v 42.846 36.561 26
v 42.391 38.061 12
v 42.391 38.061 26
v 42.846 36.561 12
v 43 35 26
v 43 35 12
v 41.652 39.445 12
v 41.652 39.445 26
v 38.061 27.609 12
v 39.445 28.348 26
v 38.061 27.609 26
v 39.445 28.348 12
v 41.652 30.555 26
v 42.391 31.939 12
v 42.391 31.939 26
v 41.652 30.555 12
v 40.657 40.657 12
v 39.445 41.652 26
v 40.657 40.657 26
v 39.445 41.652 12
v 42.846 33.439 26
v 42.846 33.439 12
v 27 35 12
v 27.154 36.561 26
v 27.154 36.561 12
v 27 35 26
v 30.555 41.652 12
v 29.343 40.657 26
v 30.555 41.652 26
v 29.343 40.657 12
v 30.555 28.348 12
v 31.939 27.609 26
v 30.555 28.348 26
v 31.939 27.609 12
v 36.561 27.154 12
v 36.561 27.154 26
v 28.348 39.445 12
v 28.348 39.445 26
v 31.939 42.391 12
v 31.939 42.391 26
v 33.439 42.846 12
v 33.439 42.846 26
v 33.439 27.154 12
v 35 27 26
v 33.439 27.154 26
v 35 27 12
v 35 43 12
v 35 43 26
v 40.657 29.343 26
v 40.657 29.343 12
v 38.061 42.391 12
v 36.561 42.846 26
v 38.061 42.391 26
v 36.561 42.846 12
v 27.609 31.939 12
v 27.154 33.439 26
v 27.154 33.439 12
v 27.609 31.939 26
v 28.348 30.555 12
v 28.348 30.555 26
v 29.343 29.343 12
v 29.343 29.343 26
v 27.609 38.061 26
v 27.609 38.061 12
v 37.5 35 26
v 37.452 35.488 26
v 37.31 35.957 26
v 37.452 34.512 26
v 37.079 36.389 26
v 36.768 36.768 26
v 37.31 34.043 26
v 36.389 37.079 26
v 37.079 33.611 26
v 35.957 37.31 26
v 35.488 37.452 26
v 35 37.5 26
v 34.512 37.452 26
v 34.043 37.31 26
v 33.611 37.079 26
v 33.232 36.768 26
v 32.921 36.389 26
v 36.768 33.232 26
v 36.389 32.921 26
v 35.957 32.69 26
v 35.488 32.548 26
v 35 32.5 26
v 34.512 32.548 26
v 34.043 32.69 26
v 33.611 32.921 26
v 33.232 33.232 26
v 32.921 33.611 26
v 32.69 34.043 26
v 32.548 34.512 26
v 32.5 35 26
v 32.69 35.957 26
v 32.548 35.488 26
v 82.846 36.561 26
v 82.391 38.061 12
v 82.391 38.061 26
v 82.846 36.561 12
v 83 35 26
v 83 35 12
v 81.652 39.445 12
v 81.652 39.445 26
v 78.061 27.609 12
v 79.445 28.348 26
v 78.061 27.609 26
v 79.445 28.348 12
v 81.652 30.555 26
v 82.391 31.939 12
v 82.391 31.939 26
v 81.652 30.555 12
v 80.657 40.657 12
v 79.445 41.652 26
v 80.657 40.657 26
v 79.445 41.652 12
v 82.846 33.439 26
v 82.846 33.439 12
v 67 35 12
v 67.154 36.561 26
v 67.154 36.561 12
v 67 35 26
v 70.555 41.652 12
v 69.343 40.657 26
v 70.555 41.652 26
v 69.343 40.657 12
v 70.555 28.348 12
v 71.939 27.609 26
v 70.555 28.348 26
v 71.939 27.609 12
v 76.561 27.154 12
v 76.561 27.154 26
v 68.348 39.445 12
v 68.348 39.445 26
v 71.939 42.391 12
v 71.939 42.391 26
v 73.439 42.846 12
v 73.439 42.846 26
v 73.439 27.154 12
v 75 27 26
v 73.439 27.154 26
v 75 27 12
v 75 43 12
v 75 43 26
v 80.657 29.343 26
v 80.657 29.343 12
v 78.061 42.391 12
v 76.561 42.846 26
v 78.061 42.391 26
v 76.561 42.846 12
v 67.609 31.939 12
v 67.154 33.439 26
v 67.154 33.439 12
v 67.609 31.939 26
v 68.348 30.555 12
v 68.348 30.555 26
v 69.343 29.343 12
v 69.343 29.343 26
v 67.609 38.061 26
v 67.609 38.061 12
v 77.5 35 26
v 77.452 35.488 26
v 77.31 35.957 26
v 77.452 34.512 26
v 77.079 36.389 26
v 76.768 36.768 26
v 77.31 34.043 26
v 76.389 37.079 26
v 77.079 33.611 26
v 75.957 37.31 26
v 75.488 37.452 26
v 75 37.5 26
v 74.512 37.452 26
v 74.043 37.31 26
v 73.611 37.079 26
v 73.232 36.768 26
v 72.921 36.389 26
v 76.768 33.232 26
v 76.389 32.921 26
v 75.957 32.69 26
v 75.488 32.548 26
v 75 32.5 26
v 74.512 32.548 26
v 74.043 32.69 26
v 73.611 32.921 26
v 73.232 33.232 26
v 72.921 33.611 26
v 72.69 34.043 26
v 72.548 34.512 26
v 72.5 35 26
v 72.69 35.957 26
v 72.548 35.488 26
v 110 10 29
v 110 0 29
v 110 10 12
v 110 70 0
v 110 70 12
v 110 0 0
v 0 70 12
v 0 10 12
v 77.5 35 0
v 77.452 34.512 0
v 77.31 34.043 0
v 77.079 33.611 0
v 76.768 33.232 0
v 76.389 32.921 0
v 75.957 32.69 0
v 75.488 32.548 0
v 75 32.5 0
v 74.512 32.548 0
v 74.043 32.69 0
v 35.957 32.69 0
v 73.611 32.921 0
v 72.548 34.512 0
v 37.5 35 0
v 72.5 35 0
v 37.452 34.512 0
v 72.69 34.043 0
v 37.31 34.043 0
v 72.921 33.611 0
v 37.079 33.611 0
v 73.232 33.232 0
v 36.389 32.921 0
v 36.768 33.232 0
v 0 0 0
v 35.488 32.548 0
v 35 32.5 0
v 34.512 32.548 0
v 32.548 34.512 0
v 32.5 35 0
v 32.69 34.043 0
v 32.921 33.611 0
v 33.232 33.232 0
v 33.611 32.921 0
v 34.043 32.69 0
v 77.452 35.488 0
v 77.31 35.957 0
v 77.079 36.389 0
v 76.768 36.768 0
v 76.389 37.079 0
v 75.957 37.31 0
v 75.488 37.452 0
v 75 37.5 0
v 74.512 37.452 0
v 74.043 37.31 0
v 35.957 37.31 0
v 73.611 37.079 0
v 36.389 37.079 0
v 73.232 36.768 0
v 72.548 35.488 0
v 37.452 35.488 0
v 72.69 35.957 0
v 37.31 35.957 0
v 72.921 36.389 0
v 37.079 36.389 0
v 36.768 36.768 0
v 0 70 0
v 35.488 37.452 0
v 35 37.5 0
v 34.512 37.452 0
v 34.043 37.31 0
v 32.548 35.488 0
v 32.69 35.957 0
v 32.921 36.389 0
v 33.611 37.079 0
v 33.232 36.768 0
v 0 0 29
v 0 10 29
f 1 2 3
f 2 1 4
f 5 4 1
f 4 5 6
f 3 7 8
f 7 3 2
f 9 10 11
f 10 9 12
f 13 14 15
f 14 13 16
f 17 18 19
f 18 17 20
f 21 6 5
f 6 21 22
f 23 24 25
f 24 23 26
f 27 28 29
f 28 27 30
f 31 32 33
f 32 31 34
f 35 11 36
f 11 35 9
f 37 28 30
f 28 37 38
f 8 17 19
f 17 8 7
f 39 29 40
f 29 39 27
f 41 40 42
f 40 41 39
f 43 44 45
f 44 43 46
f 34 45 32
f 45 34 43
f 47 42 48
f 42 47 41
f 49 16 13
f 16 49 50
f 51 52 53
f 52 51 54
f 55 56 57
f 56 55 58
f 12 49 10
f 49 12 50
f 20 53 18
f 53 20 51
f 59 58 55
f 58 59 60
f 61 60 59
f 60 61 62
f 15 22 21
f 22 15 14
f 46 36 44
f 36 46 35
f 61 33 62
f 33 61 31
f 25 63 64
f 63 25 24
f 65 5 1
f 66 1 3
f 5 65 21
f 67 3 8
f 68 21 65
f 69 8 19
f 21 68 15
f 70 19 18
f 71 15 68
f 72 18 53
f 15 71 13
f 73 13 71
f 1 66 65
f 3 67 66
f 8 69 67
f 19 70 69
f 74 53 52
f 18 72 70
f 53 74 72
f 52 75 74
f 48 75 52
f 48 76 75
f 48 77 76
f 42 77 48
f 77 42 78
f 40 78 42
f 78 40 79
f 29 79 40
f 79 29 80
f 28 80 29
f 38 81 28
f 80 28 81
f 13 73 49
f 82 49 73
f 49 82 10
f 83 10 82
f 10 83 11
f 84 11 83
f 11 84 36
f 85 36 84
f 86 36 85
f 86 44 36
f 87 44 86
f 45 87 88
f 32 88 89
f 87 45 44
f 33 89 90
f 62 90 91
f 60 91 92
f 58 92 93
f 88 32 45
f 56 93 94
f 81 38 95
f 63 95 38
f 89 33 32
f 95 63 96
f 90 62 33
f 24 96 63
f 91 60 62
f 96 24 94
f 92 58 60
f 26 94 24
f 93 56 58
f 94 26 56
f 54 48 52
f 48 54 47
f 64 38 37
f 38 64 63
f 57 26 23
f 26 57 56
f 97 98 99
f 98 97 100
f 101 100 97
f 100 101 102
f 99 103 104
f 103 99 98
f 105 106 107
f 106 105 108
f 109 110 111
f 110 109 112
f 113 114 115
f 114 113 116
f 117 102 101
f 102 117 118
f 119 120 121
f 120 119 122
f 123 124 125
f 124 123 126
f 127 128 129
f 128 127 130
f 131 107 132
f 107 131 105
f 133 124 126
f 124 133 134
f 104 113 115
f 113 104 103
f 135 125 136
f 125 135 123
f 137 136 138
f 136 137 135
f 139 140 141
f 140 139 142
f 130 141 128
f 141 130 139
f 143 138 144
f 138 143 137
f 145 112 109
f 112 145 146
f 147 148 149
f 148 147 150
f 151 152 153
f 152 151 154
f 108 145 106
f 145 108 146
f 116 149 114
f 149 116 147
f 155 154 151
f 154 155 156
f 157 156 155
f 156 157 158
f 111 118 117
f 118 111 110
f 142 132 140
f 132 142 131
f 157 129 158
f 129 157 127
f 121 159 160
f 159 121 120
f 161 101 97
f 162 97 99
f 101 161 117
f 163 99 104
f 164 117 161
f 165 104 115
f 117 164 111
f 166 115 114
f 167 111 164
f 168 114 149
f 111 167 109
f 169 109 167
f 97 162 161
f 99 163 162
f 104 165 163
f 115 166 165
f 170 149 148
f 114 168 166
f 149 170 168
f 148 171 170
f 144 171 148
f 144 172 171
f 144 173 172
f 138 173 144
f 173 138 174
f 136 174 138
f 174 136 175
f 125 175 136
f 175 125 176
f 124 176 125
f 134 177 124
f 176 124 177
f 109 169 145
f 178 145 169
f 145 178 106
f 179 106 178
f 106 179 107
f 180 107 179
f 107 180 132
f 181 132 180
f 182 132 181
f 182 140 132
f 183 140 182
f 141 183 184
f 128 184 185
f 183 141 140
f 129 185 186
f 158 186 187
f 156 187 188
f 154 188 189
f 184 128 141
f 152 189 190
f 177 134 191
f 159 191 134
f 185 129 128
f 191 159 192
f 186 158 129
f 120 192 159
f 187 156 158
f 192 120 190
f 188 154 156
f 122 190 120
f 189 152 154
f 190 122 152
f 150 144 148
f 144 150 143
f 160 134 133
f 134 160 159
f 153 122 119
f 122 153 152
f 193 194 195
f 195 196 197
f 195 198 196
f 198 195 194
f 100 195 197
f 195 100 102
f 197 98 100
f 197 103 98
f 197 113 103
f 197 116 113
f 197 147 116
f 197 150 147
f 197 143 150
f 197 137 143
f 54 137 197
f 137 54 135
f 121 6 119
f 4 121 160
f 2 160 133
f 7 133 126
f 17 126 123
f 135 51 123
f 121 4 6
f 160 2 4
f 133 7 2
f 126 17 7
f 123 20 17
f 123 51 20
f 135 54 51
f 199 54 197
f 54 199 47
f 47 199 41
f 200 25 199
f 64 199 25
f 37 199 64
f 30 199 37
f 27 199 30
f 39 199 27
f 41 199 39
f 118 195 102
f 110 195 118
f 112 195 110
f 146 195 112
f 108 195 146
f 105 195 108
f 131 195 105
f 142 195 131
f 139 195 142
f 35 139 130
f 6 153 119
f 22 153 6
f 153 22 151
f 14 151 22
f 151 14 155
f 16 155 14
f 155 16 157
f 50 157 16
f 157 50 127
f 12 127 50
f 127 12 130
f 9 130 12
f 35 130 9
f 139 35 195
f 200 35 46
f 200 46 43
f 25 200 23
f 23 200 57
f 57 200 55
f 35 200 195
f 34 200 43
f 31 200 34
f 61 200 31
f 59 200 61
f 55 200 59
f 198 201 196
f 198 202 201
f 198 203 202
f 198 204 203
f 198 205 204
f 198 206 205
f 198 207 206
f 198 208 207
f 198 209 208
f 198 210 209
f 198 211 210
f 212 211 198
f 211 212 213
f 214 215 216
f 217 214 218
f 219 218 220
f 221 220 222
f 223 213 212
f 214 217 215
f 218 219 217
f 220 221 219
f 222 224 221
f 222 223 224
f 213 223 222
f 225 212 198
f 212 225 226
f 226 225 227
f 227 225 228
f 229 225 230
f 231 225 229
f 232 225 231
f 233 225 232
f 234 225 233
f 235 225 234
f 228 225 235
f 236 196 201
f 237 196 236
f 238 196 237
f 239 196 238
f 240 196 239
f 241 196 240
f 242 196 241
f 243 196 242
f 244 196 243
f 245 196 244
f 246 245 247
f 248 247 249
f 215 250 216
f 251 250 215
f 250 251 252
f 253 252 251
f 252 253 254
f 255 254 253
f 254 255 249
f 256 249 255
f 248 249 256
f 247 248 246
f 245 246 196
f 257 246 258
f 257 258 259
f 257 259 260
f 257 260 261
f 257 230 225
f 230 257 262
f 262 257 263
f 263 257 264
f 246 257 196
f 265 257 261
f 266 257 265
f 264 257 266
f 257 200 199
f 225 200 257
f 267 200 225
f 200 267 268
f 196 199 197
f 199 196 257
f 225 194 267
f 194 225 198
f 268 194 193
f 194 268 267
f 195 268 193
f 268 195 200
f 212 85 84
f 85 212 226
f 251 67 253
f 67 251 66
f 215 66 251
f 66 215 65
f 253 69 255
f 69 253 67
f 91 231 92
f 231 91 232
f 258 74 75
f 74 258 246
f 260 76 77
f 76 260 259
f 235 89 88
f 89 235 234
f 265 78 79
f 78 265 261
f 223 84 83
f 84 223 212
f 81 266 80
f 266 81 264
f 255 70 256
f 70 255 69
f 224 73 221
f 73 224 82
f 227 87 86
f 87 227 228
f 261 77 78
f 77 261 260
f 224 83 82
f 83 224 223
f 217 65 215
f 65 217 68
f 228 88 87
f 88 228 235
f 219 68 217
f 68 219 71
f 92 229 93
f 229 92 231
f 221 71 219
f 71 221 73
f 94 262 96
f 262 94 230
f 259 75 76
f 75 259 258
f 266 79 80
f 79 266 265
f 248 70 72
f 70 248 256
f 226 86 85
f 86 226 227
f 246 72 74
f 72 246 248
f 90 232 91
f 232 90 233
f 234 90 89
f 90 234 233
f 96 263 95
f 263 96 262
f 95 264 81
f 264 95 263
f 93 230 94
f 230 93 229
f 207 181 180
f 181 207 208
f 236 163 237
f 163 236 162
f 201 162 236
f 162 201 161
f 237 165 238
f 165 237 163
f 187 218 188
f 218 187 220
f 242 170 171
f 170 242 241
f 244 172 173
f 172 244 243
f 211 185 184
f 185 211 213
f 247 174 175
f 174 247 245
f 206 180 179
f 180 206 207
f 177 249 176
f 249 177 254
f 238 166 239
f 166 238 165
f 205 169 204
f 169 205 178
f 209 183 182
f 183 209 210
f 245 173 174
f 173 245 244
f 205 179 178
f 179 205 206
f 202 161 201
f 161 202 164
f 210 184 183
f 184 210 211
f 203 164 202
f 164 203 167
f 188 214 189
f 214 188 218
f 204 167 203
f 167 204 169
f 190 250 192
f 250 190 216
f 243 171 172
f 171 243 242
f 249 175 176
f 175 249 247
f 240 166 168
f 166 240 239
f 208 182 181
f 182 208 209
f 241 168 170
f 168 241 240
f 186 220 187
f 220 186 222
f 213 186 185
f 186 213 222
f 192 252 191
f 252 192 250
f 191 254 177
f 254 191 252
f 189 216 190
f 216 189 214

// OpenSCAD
$fn = 32;

// ----------------------------------------------------------------------
// Drill jig: fence jig
// ----------------------------------------------------------------------

// --- parameters (mm) ---
plate_l = 110;            // plate length, X
plate_w = 70;             // plate width, Y
plate_t = 12;             // plate thickness
boss_d = 16;              // guide boss diameter
boss_h = 15;              // boss height above the plate
guide_d = 5;              // guide hole diameter
boss_pitch = 40;          // boss pitch
fence_h = 18;             // fence height above the plate
fence_t = 10;             // fence thickness

n_boss = 2;  // guide bosses
boss_x0 = (plate_l - (n_boss - 1) * boss_pitch) / 2;  // first boss X
boss_top = plate_t - 1 + boss_h;  // boss crown height
fence_top = plate_t - 1 + fence_h;  // fence crown height
total_h = max([fence_top, boss_top]);  // overall height

difference() {
  union() {
  cube([plate_l, plate_w, plate_t]);
  for (i = [0 : n_boss - 1])
    translate([boss_x0 + i * boss_pitch, plate_w / 2, plate_t - 1])
      cylinder(h = boss_h, d = boss_d);
  translate([0, 0, plate_t - 1]) cube([plate_l, fence_t, fence_h]);
  }
  for (i = [0 : n_boss - 1])
    translate([boss_x0 + i * boss_pitch, plate_w / 2, -1])
      cylinder(h = plate_t + boss_h, d = guide_d);
}
